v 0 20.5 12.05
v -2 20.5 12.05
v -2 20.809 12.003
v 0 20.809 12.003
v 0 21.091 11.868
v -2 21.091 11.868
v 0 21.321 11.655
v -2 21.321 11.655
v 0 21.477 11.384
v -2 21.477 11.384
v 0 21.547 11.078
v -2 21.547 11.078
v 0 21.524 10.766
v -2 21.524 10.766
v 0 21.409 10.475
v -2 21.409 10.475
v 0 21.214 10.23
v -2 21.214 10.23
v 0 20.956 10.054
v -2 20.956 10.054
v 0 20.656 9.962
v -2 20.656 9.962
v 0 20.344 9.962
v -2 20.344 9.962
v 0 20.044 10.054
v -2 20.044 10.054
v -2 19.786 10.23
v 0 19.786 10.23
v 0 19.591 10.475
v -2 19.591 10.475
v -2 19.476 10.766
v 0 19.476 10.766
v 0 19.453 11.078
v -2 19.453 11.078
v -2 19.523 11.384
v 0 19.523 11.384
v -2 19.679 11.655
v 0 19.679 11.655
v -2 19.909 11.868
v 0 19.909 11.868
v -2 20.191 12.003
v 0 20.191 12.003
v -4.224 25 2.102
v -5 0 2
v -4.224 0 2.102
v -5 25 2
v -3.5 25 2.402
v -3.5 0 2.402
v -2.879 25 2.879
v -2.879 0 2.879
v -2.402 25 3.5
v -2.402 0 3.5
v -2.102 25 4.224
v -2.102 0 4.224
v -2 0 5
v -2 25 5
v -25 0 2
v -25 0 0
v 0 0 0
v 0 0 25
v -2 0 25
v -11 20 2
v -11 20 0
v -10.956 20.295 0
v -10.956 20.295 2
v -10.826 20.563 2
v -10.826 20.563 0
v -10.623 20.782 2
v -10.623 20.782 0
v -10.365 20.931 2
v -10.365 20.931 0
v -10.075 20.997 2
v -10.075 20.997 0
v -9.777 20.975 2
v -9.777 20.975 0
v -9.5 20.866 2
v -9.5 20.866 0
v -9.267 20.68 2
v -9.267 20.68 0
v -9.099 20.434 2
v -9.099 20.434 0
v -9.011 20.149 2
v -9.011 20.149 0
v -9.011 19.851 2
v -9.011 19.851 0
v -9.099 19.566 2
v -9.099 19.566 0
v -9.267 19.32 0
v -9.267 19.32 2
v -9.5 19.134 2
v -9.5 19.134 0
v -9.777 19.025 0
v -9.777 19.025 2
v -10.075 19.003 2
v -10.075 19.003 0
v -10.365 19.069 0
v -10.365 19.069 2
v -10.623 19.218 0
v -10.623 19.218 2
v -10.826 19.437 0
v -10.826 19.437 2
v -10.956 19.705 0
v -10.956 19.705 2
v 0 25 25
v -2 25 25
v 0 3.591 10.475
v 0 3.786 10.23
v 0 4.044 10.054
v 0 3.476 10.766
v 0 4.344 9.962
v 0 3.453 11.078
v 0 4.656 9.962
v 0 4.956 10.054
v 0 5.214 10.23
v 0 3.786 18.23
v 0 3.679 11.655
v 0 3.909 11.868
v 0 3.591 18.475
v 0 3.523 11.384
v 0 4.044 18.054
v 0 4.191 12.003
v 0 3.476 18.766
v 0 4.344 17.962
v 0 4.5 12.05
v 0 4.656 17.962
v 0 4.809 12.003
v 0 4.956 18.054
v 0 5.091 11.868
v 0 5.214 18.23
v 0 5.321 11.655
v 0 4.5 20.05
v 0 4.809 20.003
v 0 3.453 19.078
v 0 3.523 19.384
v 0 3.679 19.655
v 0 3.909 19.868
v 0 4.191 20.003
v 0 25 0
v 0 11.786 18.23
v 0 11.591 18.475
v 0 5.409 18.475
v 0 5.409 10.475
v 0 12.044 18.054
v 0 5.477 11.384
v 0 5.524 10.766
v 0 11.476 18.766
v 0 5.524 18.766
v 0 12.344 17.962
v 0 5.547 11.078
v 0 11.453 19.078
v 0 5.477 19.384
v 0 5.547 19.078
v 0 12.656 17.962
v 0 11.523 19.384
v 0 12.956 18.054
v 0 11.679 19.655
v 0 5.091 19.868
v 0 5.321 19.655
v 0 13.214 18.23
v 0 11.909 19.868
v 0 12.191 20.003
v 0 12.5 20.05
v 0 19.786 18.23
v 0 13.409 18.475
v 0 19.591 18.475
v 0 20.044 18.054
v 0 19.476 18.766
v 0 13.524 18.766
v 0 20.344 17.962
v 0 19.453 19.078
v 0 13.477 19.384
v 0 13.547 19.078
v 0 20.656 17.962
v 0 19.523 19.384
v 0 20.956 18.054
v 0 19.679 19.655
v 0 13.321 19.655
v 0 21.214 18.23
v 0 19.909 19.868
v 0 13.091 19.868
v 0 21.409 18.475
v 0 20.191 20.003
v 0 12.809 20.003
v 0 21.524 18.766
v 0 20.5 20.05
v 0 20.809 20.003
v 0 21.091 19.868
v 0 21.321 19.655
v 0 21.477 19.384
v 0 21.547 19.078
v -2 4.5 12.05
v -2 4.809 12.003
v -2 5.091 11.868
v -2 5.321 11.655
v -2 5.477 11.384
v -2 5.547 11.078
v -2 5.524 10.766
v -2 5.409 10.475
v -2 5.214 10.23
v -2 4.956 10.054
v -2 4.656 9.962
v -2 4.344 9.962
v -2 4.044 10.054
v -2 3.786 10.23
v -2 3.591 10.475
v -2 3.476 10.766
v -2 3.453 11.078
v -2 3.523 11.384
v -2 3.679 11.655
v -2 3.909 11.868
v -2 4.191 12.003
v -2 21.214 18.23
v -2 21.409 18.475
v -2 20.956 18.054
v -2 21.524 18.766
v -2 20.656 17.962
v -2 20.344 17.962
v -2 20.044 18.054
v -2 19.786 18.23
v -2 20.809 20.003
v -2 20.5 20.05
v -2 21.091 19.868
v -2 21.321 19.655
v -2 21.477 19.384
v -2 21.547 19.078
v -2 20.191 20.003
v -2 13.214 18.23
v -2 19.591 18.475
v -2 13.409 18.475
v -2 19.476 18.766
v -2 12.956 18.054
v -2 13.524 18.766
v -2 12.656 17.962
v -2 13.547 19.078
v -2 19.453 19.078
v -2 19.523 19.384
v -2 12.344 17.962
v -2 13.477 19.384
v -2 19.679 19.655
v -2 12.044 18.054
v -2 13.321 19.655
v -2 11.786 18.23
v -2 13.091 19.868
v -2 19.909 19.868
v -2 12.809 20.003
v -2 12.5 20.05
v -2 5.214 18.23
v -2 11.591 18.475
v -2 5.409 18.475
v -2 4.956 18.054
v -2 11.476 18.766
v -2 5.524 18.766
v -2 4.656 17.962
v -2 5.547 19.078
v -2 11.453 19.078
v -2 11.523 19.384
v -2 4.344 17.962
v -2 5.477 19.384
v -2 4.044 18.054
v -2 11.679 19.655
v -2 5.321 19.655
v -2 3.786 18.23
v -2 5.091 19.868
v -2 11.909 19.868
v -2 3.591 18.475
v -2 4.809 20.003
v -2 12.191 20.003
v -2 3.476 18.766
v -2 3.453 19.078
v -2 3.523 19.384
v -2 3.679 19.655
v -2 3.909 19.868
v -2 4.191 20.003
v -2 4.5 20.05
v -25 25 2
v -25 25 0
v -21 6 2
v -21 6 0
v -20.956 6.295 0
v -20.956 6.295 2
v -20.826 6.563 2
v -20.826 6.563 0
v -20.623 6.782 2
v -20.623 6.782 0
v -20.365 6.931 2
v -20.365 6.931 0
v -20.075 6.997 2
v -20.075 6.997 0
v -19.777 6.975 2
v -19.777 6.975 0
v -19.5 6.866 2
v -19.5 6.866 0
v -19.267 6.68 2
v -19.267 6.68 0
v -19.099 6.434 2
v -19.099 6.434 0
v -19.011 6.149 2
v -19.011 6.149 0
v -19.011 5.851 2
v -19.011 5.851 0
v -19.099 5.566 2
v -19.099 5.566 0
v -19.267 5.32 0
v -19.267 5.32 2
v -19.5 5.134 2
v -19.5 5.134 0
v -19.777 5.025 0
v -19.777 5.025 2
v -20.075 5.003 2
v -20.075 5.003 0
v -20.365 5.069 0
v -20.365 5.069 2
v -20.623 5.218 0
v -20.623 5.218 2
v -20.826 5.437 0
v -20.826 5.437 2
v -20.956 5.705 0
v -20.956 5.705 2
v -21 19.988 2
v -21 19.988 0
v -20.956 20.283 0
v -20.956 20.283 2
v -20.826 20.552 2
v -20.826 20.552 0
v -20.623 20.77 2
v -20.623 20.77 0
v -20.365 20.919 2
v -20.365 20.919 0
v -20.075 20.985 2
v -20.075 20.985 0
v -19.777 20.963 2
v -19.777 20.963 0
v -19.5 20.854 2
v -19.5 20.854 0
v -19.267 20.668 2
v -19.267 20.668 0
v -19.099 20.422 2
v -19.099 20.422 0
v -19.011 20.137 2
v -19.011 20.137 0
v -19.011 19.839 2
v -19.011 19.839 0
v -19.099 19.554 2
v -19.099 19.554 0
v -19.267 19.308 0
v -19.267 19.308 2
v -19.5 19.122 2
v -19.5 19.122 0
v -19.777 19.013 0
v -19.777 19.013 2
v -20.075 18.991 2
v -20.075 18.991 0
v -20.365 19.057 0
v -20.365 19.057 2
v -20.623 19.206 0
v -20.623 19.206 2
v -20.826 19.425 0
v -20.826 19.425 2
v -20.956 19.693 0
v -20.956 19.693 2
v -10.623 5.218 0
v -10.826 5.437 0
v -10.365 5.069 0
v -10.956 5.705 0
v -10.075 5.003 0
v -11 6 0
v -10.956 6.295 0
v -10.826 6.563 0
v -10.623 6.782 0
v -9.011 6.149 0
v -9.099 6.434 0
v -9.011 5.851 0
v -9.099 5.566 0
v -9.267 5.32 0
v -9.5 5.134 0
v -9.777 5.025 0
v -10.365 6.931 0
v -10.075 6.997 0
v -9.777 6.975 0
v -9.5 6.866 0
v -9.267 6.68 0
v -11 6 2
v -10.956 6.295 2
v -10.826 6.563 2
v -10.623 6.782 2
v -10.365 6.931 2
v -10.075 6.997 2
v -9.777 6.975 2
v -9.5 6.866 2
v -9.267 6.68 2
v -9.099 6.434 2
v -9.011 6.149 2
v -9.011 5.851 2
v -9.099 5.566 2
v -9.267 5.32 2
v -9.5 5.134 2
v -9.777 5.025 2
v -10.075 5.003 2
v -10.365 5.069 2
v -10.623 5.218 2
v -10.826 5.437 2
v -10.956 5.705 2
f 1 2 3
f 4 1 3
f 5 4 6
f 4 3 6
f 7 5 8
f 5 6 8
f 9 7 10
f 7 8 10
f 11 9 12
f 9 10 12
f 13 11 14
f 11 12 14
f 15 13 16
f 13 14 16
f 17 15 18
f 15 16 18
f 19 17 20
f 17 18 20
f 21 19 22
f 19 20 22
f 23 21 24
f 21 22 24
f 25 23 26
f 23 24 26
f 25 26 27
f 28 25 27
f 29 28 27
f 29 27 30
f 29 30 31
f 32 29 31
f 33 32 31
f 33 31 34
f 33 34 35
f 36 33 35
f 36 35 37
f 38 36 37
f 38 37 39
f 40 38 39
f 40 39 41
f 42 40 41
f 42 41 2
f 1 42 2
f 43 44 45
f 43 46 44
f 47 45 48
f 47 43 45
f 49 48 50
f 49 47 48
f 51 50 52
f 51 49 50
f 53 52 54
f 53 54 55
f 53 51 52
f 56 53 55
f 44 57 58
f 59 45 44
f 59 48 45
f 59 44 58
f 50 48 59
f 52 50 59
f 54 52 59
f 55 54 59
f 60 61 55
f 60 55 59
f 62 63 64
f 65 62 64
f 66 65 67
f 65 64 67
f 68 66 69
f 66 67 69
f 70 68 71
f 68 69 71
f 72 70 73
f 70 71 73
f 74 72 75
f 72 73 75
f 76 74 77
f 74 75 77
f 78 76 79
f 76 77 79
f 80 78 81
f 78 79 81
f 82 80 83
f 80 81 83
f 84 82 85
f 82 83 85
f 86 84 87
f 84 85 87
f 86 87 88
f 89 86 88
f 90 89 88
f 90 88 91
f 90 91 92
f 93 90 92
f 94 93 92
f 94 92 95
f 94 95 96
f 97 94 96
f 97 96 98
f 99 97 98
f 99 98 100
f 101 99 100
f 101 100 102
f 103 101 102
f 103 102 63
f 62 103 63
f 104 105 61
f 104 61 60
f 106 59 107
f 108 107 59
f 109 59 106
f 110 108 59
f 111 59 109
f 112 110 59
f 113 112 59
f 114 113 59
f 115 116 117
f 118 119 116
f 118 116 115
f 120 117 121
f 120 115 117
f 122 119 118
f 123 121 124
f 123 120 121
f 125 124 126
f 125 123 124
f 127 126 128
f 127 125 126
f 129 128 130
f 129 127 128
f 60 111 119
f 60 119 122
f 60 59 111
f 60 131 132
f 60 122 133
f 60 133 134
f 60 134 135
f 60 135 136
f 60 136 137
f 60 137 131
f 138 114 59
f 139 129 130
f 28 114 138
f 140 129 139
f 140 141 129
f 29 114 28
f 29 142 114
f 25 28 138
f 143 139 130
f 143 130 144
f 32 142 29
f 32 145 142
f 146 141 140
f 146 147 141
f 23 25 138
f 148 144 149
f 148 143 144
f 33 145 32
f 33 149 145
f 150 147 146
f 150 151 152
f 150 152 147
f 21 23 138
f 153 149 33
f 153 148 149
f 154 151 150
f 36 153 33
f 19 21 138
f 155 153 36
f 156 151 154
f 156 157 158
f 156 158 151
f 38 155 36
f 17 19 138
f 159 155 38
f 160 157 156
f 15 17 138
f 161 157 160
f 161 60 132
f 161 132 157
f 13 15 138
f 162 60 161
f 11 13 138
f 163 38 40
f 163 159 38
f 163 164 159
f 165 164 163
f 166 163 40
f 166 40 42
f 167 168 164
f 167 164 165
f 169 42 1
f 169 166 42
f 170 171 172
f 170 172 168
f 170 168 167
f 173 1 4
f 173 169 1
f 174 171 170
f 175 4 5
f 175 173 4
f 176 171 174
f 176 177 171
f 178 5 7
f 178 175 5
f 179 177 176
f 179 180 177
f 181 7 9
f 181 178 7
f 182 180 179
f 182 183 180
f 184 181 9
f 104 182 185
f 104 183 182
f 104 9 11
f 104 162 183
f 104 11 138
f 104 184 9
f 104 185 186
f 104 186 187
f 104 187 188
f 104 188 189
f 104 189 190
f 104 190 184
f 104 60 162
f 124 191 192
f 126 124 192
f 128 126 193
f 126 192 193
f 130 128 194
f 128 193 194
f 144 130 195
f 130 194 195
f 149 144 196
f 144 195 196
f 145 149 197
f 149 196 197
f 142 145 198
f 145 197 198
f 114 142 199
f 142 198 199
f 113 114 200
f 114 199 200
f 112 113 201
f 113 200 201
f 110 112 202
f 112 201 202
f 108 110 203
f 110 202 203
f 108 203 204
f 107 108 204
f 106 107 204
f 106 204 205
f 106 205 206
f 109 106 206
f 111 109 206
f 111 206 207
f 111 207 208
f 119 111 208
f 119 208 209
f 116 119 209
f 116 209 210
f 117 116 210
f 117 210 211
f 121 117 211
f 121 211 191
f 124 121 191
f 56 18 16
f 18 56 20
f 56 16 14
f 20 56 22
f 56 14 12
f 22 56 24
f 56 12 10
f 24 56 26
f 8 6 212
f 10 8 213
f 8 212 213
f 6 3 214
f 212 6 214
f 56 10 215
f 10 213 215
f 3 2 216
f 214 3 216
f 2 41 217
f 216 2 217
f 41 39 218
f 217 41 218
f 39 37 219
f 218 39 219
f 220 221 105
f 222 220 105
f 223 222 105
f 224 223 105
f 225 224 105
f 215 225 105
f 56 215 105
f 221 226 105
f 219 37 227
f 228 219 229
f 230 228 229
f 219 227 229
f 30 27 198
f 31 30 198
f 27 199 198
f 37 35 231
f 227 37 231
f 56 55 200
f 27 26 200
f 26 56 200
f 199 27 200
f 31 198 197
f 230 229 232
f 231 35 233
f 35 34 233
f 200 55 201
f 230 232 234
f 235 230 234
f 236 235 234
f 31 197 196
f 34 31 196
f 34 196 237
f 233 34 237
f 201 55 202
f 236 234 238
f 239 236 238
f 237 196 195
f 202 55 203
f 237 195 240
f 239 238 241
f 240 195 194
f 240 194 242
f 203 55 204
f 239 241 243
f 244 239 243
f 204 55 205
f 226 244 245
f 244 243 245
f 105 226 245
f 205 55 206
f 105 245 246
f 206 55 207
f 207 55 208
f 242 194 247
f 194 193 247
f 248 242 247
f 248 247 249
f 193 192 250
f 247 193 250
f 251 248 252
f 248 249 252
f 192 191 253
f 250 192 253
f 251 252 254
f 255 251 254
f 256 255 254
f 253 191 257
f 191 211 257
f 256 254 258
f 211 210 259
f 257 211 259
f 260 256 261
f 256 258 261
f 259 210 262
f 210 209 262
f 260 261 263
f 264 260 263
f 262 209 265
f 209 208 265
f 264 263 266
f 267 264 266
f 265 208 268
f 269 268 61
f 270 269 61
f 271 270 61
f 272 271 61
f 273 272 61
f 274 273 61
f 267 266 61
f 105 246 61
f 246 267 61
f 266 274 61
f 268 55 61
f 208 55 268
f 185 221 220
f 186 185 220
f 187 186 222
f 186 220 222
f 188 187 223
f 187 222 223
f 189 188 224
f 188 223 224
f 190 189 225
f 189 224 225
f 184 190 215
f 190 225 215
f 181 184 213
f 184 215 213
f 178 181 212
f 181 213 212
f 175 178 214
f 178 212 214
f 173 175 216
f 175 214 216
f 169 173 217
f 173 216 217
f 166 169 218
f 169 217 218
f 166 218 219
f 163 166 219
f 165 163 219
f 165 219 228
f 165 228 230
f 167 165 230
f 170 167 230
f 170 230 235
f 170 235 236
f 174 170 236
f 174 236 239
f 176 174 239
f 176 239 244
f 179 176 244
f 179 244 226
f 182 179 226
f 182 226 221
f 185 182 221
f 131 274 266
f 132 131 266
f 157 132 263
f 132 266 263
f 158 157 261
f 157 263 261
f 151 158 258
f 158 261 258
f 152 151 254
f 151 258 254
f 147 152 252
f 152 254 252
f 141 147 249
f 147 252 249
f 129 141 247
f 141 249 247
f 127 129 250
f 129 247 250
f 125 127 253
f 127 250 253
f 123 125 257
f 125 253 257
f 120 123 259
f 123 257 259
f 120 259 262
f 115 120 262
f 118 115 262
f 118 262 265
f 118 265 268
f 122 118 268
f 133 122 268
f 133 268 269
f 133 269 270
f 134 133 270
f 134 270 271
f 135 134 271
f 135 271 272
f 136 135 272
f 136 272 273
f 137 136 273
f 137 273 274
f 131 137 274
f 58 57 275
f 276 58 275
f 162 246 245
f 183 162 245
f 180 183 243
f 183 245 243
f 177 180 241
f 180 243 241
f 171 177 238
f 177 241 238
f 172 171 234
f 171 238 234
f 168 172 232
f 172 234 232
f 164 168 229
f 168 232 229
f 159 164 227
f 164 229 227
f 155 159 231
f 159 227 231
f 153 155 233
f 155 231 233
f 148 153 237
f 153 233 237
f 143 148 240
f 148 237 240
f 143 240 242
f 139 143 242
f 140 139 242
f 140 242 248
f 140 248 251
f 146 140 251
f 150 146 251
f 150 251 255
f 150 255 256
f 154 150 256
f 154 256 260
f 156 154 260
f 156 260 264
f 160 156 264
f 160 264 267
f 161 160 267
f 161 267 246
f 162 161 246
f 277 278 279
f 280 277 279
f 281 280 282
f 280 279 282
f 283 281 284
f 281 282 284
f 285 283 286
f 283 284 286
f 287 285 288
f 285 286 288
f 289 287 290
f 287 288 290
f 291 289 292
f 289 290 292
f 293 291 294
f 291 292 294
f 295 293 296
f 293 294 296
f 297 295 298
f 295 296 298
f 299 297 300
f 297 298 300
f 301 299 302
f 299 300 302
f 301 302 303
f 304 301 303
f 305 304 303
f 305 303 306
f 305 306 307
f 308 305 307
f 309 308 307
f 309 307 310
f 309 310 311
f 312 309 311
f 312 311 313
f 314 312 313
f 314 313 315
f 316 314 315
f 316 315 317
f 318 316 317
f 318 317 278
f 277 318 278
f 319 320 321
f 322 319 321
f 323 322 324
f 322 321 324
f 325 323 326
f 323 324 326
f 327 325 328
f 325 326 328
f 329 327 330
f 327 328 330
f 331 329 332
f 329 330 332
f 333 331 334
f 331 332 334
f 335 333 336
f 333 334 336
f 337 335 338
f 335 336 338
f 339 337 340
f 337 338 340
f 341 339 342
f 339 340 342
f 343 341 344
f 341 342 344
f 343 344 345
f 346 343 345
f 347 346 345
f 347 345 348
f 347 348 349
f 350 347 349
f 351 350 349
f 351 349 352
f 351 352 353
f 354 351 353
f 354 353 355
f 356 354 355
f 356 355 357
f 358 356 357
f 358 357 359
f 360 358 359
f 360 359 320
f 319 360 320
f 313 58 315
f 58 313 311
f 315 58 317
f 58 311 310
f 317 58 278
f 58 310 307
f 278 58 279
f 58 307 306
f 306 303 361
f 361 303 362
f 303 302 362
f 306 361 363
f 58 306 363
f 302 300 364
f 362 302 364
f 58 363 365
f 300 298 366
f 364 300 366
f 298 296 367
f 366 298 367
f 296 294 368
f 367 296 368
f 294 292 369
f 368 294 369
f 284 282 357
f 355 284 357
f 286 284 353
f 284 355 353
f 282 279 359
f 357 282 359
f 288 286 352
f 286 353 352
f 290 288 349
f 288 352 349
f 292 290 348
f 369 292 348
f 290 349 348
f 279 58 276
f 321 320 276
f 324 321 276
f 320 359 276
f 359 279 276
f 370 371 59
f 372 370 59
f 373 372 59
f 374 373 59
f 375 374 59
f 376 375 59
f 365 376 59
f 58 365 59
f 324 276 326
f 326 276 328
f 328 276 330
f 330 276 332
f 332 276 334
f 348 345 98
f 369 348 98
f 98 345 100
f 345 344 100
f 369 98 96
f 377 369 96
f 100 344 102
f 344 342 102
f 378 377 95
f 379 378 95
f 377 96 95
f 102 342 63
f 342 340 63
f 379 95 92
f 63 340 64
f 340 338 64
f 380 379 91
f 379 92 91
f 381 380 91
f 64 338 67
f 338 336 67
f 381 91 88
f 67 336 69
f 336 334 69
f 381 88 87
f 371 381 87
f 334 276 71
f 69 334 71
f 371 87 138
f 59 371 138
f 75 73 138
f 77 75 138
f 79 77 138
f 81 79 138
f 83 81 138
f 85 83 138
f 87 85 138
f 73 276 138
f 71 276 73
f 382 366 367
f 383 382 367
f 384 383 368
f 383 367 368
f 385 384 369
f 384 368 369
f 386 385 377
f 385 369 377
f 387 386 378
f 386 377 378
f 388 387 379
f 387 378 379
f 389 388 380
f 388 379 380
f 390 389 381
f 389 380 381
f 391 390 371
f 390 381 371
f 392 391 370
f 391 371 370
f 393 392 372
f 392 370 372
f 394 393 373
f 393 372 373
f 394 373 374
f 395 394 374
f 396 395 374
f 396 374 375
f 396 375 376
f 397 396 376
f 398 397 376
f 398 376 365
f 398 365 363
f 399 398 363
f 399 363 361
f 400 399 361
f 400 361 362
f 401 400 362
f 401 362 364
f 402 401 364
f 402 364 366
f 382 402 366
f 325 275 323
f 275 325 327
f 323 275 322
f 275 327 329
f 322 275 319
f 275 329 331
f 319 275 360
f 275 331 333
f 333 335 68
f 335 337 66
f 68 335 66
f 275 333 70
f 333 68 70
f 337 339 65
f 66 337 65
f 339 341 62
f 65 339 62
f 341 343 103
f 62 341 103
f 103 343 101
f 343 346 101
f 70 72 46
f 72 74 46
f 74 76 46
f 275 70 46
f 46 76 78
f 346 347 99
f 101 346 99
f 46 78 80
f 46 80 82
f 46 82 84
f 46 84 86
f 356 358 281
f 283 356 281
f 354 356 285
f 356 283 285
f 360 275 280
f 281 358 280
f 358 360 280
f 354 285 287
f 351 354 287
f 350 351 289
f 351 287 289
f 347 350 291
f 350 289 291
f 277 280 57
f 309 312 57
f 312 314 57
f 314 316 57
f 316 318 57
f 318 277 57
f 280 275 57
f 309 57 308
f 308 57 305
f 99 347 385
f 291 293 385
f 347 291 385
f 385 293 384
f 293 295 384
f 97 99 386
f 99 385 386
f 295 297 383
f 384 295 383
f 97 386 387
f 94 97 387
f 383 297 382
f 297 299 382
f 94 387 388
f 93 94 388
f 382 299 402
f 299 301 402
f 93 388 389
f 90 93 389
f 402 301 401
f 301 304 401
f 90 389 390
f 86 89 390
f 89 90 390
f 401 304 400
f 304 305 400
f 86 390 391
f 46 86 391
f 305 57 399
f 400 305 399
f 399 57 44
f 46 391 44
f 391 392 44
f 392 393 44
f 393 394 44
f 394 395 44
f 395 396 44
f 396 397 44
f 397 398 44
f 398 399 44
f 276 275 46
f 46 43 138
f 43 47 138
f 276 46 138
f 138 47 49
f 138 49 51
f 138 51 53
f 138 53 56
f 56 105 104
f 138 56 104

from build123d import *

# Parameters (mm, degrees)
SKETCH_1_W                  = 25
SKETCH_1_H                  = 25
EXTRUDE_1_DEPTH             = 25
SKETCH_2_W                  = 23
SKETCH_2_H                  = 23
CUT_EXTRUDE_1_DEPTH         = 44.301270189
HOLE_WIZARD_2_0_2_1_D       = 2
HOLE_WIZARD_2_1_2_1_1_D     = 2.1
HOLE_WIZARD_2_1_2_1_1_DEPTH = 25
FILLET_1_R                  = 3


with BuildPart() as part:
    # 草图1 → 凸台-拉伸1 (new body)
    with BuildSketch(Plane.XY.offset(25)):
        with Locations((-12.5, 12.5)):
            Rectangle(SKETCH_1_W, SKETCH_1_H)
    extrude(amount=-EXTRUDE_1_DEPTH)

    # 草图2 → 切除-拉伸1 (cut, through all)
    with BuildSketch(Plane.XZ):
        with Locations((-13.5, 13.5)):
            Rectangle(SKETCH_2_W, SKETCH_2_H)
    extrude(amount=-CUT_EXTRUDE_1_DEPTH, mode=Mode.SUBTRACT)

    # Ø2.0 (2) 直径孔1 (through all)
    with Locations(Plane.XY.offset(2)):
        with Locations((-10, 20), (-10, 6), (-20, 6), (-20, 19.98825417)):
            Hole(HOLE_WIZARD_2_0_2_1_D / 2)

    # Ø2.1 (2.1) 直径孔1
    with Locations(Plane(origin=(0, 0, 0), x_dir=(0, 0, -1), z_dir=(1, 0, 0))):
        with Locations((-19, 20.5), (-19, 4.5), (-19, 12.5), (-11, 4.5), (-11, 20.5)):
            Hole(HOLE_WIZARD_2_1_2_1_1_D / 2, depth=HOLE_WIZARD_2_1_2_1_1_DEPTH)

    # 圆角1
    fillet_1_edges = [part.edges().sort_by_distance(p)[0] for p in [
        (-2, 12.5, 2),
    ]]
    fillet(fillet_1_edges, radius=FILLET_1_R)


solid = part.part
